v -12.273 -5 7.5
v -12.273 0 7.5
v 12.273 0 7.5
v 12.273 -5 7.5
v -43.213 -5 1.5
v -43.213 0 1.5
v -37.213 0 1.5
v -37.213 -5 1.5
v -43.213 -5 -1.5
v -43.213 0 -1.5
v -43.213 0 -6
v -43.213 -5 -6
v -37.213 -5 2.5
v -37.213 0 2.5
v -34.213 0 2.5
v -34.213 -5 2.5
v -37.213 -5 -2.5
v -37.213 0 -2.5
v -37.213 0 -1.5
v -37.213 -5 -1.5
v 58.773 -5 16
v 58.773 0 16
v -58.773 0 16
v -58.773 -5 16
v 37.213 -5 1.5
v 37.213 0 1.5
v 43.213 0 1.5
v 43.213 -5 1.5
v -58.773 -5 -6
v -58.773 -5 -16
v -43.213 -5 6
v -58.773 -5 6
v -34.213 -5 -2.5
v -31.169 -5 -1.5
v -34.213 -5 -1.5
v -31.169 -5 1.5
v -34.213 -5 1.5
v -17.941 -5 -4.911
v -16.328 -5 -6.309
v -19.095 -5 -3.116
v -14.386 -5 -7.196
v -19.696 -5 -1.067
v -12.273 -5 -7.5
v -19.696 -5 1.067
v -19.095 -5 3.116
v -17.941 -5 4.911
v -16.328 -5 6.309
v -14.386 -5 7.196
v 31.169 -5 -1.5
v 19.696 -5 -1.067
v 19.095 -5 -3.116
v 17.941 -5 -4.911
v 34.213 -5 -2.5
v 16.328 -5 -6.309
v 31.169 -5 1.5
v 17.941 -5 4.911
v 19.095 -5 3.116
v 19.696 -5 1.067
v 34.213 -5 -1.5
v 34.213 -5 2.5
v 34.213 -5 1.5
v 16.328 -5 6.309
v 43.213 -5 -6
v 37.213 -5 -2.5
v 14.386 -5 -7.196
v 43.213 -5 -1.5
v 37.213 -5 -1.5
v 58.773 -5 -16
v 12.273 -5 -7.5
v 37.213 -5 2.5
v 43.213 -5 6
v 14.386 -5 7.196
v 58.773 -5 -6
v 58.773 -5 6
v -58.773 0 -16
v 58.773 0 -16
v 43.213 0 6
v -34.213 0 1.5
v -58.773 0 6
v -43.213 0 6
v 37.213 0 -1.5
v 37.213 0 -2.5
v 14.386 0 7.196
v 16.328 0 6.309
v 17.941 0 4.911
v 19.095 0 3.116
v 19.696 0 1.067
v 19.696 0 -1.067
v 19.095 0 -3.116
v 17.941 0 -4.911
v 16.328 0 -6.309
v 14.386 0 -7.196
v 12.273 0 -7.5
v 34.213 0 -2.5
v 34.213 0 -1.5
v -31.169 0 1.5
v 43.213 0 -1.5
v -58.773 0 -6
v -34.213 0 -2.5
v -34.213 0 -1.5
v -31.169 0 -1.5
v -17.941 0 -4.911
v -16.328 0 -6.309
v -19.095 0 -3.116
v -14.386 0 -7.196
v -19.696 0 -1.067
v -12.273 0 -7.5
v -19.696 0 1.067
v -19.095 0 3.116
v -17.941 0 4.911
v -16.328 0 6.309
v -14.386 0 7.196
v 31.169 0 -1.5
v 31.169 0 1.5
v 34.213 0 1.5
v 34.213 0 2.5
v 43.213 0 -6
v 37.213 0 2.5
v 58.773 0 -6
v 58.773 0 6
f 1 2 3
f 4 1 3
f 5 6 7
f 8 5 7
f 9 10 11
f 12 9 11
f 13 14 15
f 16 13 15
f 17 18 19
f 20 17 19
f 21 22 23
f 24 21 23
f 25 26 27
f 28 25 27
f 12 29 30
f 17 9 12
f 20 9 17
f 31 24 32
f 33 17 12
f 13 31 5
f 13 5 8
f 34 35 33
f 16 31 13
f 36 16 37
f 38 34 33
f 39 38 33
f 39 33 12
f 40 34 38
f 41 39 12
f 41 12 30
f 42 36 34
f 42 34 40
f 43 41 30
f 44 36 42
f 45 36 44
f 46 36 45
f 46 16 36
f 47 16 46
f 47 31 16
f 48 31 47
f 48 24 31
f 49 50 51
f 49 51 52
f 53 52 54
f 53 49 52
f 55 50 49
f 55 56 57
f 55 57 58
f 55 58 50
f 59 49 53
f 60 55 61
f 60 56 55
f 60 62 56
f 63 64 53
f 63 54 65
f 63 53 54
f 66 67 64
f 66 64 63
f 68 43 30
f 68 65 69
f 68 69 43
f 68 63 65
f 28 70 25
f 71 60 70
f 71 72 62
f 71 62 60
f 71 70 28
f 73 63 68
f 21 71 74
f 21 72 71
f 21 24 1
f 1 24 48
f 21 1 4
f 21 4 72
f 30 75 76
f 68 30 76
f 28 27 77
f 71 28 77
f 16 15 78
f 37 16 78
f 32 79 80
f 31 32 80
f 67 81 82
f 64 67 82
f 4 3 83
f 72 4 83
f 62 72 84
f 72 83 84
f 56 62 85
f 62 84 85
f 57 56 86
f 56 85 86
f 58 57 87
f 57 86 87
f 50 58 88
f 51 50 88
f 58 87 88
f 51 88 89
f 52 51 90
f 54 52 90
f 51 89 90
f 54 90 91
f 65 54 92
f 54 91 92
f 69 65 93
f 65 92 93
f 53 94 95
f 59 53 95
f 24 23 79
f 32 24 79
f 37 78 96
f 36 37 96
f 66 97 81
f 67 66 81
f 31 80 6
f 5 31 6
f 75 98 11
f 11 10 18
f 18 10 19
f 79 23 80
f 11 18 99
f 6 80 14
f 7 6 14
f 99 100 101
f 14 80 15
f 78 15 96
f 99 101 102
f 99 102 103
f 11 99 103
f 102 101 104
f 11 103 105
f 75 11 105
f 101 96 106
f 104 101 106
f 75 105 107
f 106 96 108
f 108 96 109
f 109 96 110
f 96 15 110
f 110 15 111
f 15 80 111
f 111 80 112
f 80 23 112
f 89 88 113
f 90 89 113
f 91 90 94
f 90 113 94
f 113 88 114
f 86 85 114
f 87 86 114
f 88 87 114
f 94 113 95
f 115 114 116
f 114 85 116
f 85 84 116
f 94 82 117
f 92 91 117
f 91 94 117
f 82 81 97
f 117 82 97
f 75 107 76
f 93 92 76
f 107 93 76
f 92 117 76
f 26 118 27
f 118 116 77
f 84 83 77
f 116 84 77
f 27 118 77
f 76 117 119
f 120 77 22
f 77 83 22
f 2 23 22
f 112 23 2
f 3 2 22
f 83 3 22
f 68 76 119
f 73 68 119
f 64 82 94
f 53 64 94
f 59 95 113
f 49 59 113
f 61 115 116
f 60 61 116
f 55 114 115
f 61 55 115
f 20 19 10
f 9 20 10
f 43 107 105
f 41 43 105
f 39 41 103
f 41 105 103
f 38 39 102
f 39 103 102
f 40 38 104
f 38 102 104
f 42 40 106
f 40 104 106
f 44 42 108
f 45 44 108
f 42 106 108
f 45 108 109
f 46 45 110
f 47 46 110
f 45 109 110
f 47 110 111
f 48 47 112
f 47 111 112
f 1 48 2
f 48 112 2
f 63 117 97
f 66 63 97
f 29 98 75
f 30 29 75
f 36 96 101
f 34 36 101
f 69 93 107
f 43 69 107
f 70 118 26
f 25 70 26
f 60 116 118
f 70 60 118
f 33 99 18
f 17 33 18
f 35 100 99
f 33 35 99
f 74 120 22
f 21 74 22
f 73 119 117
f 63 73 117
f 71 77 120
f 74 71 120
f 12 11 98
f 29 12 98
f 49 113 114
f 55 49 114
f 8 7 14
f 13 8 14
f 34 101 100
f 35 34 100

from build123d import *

# Parameters (mm, degrees)
F1_DEPTH = 5


with BuildPart() as f1:
    # F0 (on Front) → F1 (new body)
    with BuildSketch(Plane.XZ):
        Polygon((-58.772724, -16), (0, -16), (58.772724, -16), (58.772724, -6), (43.212797, -6), (43.212797, -1.5), (37.212797, -1.5), (37.212797, -2.5), (34.212797, -2.5), (34.212797, -1.5), (31.168662, -1.5), (31.168662, 0), (31.168662, 1.5), (34.212797, 1.5), (34.212797, 2.5), (37.212797, 2.5), (37.212797, 1.5), (43.212797, 1.5), (43.212797, 6), (58.772724, 6), (58.772724, 16), (0, 16), (-58.772724, 16), (-58.772724, 6), (-43.212797, 6), (-43.212797, 1.5), (-37.212797, 1.5), (-37.212797, 2.5), (-34.212797, 2.5), (-34.212797, 1.5), (-31.168662, 1.5), (-31.168662, 0), (-31.168662, -1.5), (-34.212797, -1.5), (-34.212797, -2.5), (-37.212797, -2.5), (-37.212797, -1.5), (-43.212797, -1.5), (-43.212797, -6), (-58.772724, -6), align=None)
        with BuildLine():
            ThreePointArc((12.272724, 7.5), (19.772724, 0), (12.272724, -7.5))
            Line((12.272724, -7.5), (0, -7.5))
            Line((0, -7.5), (-12.272724, -7.5))
            ThreePointArc((-12.272724, -7.5), (-19.772724, 0), (-12.272724, 7.5))
            Line((-12.272724, 7.5), (0, 7.5))
            Line((0, 7.5), (12.272724, 7.5))
        make_face(mode=Mode.SUBTRACT)
    extrude(amount=F1_DEPTH)


solid = f1.part
